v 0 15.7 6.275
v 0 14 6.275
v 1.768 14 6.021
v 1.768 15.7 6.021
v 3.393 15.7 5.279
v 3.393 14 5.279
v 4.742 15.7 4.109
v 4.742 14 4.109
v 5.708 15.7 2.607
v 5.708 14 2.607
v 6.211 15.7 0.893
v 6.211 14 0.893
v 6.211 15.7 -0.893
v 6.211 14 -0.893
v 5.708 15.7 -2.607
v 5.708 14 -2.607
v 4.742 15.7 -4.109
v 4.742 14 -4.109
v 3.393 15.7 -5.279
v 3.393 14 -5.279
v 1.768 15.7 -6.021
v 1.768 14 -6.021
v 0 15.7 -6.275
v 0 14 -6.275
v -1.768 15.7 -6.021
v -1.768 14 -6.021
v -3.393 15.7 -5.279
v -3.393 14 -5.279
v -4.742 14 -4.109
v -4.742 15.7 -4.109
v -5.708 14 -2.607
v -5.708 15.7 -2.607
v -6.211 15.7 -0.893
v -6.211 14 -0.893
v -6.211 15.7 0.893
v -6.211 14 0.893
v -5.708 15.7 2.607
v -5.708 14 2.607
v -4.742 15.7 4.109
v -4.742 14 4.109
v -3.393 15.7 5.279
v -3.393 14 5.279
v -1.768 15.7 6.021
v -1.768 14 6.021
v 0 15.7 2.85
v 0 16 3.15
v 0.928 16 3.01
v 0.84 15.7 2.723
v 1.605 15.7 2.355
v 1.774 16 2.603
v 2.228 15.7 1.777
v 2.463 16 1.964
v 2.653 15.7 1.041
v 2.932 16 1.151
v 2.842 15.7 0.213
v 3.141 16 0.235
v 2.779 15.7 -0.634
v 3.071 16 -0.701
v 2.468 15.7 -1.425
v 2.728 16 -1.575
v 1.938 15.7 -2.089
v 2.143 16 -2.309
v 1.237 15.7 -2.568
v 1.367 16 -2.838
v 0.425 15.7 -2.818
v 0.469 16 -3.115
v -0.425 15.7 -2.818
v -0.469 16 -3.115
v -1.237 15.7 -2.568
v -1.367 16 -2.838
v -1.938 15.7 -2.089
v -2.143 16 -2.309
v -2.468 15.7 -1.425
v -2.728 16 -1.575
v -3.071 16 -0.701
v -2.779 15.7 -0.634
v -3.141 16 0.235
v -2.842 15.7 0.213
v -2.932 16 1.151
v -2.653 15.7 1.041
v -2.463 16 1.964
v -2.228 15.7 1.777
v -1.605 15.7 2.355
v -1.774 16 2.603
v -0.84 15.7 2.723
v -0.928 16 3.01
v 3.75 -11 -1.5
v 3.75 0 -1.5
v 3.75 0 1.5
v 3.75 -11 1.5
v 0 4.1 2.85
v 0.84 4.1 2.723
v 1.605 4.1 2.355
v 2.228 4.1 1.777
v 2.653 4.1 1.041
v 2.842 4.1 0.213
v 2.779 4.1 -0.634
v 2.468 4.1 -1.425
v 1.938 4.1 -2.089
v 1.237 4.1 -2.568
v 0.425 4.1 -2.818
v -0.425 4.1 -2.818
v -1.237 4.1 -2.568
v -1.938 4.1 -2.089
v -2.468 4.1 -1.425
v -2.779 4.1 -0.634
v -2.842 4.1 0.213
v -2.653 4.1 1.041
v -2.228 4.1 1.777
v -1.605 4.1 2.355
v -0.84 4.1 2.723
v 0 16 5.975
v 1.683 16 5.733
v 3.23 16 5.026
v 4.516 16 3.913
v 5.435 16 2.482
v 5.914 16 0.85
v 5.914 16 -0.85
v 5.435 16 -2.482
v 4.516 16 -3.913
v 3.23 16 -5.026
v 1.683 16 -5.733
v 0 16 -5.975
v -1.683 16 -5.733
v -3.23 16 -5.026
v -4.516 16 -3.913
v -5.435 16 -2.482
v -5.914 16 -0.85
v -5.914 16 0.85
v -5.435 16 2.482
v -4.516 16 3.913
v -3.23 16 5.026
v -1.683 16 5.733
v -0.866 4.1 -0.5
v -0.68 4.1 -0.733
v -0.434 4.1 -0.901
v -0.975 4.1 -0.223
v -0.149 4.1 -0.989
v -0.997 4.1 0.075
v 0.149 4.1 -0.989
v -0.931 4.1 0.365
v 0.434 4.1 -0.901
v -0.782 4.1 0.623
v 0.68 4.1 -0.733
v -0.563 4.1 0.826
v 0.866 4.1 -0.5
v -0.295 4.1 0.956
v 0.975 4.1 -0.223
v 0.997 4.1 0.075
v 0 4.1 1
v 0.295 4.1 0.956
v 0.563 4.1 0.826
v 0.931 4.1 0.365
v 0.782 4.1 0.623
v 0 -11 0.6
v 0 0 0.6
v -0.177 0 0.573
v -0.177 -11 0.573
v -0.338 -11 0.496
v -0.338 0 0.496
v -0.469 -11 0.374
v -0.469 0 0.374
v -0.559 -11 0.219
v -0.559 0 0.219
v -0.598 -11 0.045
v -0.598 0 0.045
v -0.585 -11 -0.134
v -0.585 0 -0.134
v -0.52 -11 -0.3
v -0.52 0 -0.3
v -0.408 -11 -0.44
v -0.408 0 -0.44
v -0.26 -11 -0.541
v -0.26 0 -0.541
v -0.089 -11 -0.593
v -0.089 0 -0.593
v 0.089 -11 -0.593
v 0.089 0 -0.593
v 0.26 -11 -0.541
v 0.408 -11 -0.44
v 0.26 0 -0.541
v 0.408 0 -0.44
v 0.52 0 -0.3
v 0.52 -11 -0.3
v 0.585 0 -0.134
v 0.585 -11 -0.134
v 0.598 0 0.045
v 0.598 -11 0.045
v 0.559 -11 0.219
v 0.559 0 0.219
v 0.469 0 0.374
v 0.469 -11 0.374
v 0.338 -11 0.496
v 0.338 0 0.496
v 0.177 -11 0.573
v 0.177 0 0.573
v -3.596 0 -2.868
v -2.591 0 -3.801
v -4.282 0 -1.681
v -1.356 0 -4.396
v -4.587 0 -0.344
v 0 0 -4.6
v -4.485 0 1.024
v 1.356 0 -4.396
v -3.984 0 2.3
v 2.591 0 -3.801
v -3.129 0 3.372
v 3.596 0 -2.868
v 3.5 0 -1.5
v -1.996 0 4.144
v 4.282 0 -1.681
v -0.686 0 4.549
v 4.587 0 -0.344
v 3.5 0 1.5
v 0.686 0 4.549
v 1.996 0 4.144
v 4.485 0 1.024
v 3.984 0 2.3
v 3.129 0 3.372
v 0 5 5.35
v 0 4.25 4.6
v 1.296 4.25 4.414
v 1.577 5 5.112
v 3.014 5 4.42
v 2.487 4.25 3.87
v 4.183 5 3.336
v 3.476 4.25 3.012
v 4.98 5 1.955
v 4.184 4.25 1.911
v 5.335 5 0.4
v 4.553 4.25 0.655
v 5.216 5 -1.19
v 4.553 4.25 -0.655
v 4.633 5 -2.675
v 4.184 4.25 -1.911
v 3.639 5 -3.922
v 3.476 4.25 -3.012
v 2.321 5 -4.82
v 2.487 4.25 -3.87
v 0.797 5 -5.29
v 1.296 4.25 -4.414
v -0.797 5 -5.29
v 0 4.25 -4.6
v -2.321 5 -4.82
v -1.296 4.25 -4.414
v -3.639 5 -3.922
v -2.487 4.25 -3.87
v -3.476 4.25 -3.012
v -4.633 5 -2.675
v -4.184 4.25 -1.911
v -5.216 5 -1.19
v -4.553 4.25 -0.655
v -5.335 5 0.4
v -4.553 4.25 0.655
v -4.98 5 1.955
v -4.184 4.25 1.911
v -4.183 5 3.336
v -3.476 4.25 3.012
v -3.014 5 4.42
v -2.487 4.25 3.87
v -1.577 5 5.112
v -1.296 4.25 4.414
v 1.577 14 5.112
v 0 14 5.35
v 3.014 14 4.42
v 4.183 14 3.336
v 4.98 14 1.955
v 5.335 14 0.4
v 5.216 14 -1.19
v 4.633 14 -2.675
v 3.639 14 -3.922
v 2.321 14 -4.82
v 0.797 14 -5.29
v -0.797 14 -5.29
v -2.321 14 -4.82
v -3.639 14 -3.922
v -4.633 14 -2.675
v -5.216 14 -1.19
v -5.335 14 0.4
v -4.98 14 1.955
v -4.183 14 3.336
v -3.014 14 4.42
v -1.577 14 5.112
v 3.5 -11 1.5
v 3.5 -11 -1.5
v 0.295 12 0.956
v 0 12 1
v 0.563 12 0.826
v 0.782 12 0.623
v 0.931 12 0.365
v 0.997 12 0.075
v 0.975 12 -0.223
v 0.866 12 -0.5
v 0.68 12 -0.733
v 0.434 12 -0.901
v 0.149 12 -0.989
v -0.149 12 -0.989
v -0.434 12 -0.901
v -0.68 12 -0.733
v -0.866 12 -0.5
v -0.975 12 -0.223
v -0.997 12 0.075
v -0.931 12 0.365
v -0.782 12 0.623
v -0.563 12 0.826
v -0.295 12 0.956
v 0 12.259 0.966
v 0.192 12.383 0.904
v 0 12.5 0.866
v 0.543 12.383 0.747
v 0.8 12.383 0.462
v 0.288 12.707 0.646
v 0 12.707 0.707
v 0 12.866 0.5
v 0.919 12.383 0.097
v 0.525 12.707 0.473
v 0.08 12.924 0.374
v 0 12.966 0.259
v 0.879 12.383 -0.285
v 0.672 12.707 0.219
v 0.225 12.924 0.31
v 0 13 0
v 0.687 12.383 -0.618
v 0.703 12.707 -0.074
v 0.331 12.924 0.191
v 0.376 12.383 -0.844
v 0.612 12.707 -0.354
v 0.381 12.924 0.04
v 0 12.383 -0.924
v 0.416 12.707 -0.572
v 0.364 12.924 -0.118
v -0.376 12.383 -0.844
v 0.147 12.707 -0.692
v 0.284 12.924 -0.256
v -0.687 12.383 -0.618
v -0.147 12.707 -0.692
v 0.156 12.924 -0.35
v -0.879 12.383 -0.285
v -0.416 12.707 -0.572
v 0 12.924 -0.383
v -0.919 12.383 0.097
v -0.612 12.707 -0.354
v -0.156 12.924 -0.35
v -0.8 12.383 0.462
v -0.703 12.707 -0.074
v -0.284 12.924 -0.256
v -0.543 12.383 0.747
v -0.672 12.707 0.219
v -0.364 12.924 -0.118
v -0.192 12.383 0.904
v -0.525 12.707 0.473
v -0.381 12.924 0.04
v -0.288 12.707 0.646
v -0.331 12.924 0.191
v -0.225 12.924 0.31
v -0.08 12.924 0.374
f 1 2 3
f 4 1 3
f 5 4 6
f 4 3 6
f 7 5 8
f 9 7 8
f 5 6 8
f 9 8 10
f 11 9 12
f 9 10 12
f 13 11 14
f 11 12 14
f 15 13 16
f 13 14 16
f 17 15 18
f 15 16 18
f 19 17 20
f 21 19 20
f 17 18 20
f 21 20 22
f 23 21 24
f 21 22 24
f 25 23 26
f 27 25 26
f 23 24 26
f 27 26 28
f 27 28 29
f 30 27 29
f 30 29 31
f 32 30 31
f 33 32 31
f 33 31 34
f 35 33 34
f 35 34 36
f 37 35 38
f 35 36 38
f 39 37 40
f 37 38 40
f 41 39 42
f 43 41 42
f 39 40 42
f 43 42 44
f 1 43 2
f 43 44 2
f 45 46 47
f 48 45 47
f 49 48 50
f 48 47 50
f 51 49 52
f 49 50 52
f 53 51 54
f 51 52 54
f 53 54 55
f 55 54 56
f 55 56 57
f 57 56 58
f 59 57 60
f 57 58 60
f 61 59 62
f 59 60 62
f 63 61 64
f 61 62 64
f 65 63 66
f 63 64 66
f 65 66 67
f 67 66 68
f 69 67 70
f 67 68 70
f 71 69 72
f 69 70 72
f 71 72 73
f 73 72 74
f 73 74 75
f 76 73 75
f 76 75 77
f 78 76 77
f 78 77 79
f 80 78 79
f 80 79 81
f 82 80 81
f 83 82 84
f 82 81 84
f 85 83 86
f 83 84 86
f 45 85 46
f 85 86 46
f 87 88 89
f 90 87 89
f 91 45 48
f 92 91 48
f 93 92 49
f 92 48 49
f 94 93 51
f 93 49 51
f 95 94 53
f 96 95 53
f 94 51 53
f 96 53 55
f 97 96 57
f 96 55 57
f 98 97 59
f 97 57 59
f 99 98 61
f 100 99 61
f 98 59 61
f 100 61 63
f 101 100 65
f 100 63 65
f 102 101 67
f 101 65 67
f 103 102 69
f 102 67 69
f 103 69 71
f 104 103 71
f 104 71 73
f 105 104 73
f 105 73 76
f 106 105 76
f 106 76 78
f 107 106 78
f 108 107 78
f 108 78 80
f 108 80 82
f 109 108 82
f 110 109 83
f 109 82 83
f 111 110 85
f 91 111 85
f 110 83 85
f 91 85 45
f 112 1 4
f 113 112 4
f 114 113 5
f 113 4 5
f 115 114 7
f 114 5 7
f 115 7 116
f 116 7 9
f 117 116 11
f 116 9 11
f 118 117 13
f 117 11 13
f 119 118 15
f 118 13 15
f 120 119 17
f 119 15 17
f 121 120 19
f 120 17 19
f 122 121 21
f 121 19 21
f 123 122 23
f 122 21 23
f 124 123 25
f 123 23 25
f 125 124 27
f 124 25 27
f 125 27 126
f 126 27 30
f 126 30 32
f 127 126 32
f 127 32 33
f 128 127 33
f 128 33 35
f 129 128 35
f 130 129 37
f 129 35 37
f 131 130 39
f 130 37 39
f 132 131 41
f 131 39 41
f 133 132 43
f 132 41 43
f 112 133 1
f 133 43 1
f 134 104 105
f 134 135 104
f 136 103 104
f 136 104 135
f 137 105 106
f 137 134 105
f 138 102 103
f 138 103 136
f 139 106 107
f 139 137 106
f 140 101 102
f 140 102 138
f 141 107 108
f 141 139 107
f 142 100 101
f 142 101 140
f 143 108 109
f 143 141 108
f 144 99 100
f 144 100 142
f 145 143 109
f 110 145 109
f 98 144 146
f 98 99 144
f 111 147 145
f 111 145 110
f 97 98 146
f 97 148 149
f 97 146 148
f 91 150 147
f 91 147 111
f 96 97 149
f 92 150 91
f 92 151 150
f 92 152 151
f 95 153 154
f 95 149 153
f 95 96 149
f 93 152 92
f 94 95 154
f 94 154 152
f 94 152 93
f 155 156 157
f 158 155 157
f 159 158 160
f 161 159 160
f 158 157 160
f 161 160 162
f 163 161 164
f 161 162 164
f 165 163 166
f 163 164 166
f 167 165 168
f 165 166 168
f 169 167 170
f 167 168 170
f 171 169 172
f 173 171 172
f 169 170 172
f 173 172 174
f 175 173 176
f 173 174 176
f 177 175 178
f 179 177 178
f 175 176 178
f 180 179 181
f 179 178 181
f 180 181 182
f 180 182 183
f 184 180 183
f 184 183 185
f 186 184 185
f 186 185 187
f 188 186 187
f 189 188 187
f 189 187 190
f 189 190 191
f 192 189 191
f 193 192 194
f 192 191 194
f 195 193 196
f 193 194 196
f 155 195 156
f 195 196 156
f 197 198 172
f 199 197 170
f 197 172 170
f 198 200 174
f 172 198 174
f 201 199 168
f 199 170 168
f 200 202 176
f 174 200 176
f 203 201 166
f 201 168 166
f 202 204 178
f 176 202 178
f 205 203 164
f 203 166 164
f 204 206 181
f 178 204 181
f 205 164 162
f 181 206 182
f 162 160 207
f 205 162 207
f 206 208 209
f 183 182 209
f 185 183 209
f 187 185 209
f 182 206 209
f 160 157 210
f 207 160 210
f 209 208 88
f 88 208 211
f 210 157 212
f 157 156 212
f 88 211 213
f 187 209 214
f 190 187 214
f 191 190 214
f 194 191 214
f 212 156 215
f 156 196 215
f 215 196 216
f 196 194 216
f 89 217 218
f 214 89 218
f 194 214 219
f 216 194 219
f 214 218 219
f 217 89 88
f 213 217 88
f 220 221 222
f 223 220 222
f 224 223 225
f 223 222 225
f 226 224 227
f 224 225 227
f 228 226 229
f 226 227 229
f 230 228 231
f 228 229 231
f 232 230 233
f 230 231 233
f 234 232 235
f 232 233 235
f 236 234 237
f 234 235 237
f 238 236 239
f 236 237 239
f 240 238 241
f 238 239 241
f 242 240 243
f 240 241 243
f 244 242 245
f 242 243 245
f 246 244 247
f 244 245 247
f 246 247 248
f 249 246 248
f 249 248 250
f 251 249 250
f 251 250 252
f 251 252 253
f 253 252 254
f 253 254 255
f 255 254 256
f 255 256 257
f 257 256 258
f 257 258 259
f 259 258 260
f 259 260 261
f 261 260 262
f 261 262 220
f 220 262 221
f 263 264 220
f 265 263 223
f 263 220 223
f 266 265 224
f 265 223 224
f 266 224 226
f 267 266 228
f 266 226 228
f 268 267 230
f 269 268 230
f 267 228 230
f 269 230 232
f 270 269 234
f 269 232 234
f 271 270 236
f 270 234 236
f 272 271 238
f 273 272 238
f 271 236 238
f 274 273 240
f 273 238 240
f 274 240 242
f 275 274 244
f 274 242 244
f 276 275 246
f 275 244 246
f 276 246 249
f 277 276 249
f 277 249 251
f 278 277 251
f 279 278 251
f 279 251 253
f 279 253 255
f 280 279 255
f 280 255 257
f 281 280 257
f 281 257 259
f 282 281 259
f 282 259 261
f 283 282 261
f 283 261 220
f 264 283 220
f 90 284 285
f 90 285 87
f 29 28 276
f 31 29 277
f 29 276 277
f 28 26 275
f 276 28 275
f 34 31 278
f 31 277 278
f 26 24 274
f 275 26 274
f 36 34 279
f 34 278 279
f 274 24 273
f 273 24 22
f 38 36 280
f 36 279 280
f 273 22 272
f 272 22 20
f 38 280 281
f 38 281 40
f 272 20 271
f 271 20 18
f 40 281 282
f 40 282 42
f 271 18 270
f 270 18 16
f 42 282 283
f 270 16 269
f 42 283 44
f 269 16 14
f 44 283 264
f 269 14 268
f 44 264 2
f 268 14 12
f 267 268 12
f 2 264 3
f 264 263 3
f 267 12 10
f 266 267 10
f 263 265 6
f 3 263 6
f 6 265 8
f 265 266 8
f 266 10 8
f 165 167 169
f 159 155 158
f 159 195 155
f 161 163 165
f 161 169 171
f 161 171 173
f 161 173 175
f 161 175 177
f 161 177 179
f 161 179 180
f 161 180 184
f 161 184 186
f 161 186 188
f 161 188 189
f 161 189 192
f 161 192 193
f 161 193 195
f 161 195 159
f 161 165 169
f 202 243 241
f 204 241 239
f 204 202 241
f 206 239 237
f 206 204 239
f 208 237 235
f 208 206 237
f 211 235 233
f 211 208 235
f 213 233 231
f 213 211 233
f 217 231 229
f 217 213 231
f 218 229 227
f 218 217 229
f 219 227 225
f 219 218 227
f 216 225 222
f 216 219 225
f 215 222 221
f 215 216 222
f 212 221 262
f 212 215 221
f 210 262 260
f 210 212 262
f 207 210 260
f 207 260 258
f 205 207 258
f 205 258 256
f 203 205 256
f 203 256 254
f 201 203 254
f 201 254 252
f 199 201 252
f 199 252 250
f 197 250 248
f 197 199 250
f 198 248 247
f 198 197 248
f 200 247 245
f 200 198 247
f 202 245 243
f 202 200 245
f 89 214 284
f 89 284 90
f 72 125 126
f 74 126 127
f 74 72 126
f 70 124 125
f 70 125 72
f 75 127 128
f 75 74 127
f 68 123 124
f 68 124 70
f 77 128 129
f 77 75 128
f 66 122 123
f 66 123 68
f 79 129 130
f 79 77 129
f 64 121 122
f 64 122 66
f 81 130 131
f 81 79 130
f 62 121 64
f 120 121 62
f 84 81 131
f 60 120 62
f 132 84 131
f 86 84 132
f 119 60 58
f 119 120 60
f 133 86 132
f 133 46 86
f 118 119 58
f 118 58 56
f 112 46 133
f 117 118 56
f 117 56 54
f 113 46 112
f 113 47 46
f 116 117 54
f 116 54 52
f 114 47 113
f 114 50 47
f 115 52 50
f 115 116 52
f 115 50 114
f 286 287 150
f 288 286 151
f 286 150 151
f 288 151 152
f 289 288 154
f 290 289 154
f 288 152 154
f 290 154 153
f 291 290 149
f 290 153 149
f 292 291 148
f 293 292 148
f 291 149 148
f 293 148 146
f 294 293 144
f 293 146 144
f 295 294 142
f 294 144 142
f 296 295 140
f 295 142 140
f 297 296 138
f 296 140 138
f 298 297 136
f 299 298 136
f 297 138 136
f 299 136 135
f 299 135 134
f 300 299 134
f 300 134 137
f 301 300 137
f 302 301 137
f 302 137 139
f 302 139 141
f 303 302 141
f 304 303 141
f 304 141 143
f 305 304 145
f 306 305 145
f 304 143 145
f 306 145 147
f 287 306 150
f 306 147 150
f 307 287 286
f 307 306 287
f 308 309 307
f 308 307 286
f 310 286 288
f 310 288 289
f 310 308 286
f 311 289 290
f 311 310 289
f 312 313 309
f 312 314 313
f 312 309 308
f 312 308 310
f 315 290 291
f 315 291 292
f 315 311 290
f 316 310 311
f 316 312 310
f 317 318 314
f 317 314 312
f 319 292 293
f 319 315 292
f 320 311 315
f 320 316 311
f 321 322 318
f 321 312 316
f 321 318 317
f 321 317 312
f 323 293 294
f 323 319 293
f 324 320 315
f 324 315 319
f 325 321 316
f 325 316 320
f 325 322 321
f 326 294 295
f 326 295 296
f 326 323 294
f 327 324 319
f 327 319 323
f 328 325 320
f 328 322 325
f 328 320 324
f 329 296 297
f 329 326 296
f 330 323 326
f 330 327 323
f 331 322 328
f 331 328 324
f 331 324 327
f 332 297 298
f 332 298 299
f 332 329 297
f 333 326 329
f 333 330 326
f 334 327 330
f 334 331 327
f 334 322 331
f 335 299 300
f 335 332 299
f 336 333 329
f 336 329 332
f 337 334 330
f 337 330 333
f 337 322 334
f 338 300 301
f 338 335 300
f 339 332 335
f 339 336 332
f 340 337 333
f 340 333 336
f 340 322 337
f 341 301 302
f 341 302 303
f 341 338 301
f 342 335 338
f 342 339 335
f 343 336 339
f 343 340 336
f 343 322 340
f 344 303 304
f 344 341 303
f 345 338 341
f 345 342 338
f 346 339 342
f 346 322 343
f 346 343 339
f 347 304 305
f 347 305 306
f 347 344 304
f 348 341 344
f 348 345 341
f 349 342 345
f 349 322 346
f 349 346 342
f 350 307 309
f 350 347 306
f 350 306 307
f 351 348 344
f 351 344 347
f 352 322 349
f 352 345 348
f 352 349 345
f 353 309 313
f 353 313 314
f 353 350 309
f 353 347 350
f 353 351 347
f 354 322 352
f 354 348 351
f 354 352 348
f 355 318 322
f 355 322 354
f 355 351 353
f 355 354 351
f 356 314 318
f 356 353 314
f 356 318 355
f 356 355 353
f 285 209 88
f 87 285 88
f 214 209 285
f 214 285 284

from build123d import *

# Parameters (mm, degrees)
SKETCH1_R           = 5.35
BOSS_EXTRUDE1_DEPTH = 14
SKETCH2_R           = 6.275
BOSS_EXTRUDE2_DEPTH = 2
SKETCH3_R           = 2.85
CUT_EXTRUDE1_DEPTH  = 11.9
SKETCH4_R           = 1
BOSS_EXTRUDE3_DEPTH = 8.9
FILLET1_R           = 1
CHAMFER1_SIZE       = 0.3
SKETCH5_R           = 5.35
SKETCH5_R_2         = 4.6
CUT_EXTRUDE2_DEPTH  = 4
CHAMFER2_SIZE       = 1
SKETCH6_R           = 0.6
SKETCH6_W           = 0.25
SKETCH6_H           = 3
BOSS_EXTRUDE4_DEPTH = 11


with BuildPart() as part:
    # Sketch1 → Boss-Extrude1 (new body)
    with BuildSketch(Plane(origin=(0, 0, 0), x_dir=(1, 0, 0), z_dir=(0, 1, 0))):
        with Locations(Location((0, 0, 0), (0, 0, 270))):
            Circle(SKETCH1_R)
    extrude(amount=BOSS_EXTRUDE1_DEPTH)

    # Sketch2 → Boss-Extrude2 (add)
    with BuildSketch(Plane(origin=(0, 14, 0), x_dir=(1, 0, 0), z_dir=(0, 1, 0))):
        with Locations(Location((0, 0, 0), (0, 0, 270))):
            Circle(SKETCH2_R)
    extrude(amount=BOSS_EXTRUDE2_DEPTH)

    # Sketch3 → Cut-Extrude1 (cut)
    with BuildSketch(Plane(origin=(0, 16, 0), x_dir=(1, 0, 0), z_dir=(0, 1, 0))):
        with Locations(Location((0, 0, 0), (0, 0, 270))):
            Circle(SKETCH3_R)
    extrude(amount=-CUT_EXTRUDE1_DEPTH, mode=Mode.SUBTRACT)

    # Sketch4 → Boss-Extrude3 (add)
    with BuildSketch(Plane(origin=(0, 4.1, 0), x_dir=(1, 0, 0), z_dir=(0, 1, 0))):
        with Locations(Location((0, 0, 0), (0, 0, 270))):
            Circle(SKETCH4_R)
    extrude(amount=BOSS_EXTRUDE3_DEPTH)

    # Fillet1
    fillet1_edges = [part.edges().sort_by_distance(p)[0] for p in [
        (0, 13, -1),
    ]]
    fillet(fillet1_edges, radius=FILLET1_R)

    # Chamfer1
    chamfer1_edges = [part.edges().sort_by_distance(p)[0] for p in [
        (0, 16, -2.85),
        (0, 16, -6.275),
    ]]
    chamfer(chamfer1_edges, length=CHAMFER1_SIZE)

    # Sketch5 → Cut-Extrude2 (cut)
    with BuildSketch(Plane.XZ):
        with Locations(Location((0, 0, 0), (0, 0, 270))):
            Circle(SKETCH5_R)
        with Locations(Location((0, 0, 0), (0, 0, 270))):
            Circle(SKETCH5_R_2, mode=Mode.SUBTRACT)
    extrude(amount=-CUT_EXTRUDE2_DEPTH, mode=Mode.SUBTRACT)

    # Chamfer2
    # the kernel refuses this chamfer: 1 mm, written as the material it takes off along each edge
    with BuildSketch(Plane(origin=(0, 4, 0), x_dir=(0, 0, 1), z_dir=(-1, 0, 0))) as chamfer2_piece_1_section:
        Polygon((5.35, CHAMFER2_SIZE), (5.35 - CHAMFER2_SIZE, 0), (5.35, 0), align=None)
    chamfer2_piece_1 = revolve(axis=Axis((0, 4, 0), (0, 1, 0)), mode=Mode.PRIVATE)
    chamfer2_piece_1 = chamfer2_piece_1 - Plane(origin=(0, 4.621256609, 0), x_dir=(0, 0, -1), z_dir=(0, -1, 0)) * Cylinder(4.6, 22, mode=Mode.PRIVATE)
    add(chamfer2_piece_1, mode=Mode.SUBTRACT)

    # Sketch6 → Boss-Extrude4 (add)
    with BuildSketch(Plane.XZ):
        with Locations(Location((0, 0, 0), (0, 0, 90))):
            Circle(SKETCH6_R)
        with Locations((3.625, 0)):
            Rectangle(SKETCH6_W, SKETCH6_H)
    extrude(amount=BOSS_EXTRUDE4_DEPTH)


solid = part.part
